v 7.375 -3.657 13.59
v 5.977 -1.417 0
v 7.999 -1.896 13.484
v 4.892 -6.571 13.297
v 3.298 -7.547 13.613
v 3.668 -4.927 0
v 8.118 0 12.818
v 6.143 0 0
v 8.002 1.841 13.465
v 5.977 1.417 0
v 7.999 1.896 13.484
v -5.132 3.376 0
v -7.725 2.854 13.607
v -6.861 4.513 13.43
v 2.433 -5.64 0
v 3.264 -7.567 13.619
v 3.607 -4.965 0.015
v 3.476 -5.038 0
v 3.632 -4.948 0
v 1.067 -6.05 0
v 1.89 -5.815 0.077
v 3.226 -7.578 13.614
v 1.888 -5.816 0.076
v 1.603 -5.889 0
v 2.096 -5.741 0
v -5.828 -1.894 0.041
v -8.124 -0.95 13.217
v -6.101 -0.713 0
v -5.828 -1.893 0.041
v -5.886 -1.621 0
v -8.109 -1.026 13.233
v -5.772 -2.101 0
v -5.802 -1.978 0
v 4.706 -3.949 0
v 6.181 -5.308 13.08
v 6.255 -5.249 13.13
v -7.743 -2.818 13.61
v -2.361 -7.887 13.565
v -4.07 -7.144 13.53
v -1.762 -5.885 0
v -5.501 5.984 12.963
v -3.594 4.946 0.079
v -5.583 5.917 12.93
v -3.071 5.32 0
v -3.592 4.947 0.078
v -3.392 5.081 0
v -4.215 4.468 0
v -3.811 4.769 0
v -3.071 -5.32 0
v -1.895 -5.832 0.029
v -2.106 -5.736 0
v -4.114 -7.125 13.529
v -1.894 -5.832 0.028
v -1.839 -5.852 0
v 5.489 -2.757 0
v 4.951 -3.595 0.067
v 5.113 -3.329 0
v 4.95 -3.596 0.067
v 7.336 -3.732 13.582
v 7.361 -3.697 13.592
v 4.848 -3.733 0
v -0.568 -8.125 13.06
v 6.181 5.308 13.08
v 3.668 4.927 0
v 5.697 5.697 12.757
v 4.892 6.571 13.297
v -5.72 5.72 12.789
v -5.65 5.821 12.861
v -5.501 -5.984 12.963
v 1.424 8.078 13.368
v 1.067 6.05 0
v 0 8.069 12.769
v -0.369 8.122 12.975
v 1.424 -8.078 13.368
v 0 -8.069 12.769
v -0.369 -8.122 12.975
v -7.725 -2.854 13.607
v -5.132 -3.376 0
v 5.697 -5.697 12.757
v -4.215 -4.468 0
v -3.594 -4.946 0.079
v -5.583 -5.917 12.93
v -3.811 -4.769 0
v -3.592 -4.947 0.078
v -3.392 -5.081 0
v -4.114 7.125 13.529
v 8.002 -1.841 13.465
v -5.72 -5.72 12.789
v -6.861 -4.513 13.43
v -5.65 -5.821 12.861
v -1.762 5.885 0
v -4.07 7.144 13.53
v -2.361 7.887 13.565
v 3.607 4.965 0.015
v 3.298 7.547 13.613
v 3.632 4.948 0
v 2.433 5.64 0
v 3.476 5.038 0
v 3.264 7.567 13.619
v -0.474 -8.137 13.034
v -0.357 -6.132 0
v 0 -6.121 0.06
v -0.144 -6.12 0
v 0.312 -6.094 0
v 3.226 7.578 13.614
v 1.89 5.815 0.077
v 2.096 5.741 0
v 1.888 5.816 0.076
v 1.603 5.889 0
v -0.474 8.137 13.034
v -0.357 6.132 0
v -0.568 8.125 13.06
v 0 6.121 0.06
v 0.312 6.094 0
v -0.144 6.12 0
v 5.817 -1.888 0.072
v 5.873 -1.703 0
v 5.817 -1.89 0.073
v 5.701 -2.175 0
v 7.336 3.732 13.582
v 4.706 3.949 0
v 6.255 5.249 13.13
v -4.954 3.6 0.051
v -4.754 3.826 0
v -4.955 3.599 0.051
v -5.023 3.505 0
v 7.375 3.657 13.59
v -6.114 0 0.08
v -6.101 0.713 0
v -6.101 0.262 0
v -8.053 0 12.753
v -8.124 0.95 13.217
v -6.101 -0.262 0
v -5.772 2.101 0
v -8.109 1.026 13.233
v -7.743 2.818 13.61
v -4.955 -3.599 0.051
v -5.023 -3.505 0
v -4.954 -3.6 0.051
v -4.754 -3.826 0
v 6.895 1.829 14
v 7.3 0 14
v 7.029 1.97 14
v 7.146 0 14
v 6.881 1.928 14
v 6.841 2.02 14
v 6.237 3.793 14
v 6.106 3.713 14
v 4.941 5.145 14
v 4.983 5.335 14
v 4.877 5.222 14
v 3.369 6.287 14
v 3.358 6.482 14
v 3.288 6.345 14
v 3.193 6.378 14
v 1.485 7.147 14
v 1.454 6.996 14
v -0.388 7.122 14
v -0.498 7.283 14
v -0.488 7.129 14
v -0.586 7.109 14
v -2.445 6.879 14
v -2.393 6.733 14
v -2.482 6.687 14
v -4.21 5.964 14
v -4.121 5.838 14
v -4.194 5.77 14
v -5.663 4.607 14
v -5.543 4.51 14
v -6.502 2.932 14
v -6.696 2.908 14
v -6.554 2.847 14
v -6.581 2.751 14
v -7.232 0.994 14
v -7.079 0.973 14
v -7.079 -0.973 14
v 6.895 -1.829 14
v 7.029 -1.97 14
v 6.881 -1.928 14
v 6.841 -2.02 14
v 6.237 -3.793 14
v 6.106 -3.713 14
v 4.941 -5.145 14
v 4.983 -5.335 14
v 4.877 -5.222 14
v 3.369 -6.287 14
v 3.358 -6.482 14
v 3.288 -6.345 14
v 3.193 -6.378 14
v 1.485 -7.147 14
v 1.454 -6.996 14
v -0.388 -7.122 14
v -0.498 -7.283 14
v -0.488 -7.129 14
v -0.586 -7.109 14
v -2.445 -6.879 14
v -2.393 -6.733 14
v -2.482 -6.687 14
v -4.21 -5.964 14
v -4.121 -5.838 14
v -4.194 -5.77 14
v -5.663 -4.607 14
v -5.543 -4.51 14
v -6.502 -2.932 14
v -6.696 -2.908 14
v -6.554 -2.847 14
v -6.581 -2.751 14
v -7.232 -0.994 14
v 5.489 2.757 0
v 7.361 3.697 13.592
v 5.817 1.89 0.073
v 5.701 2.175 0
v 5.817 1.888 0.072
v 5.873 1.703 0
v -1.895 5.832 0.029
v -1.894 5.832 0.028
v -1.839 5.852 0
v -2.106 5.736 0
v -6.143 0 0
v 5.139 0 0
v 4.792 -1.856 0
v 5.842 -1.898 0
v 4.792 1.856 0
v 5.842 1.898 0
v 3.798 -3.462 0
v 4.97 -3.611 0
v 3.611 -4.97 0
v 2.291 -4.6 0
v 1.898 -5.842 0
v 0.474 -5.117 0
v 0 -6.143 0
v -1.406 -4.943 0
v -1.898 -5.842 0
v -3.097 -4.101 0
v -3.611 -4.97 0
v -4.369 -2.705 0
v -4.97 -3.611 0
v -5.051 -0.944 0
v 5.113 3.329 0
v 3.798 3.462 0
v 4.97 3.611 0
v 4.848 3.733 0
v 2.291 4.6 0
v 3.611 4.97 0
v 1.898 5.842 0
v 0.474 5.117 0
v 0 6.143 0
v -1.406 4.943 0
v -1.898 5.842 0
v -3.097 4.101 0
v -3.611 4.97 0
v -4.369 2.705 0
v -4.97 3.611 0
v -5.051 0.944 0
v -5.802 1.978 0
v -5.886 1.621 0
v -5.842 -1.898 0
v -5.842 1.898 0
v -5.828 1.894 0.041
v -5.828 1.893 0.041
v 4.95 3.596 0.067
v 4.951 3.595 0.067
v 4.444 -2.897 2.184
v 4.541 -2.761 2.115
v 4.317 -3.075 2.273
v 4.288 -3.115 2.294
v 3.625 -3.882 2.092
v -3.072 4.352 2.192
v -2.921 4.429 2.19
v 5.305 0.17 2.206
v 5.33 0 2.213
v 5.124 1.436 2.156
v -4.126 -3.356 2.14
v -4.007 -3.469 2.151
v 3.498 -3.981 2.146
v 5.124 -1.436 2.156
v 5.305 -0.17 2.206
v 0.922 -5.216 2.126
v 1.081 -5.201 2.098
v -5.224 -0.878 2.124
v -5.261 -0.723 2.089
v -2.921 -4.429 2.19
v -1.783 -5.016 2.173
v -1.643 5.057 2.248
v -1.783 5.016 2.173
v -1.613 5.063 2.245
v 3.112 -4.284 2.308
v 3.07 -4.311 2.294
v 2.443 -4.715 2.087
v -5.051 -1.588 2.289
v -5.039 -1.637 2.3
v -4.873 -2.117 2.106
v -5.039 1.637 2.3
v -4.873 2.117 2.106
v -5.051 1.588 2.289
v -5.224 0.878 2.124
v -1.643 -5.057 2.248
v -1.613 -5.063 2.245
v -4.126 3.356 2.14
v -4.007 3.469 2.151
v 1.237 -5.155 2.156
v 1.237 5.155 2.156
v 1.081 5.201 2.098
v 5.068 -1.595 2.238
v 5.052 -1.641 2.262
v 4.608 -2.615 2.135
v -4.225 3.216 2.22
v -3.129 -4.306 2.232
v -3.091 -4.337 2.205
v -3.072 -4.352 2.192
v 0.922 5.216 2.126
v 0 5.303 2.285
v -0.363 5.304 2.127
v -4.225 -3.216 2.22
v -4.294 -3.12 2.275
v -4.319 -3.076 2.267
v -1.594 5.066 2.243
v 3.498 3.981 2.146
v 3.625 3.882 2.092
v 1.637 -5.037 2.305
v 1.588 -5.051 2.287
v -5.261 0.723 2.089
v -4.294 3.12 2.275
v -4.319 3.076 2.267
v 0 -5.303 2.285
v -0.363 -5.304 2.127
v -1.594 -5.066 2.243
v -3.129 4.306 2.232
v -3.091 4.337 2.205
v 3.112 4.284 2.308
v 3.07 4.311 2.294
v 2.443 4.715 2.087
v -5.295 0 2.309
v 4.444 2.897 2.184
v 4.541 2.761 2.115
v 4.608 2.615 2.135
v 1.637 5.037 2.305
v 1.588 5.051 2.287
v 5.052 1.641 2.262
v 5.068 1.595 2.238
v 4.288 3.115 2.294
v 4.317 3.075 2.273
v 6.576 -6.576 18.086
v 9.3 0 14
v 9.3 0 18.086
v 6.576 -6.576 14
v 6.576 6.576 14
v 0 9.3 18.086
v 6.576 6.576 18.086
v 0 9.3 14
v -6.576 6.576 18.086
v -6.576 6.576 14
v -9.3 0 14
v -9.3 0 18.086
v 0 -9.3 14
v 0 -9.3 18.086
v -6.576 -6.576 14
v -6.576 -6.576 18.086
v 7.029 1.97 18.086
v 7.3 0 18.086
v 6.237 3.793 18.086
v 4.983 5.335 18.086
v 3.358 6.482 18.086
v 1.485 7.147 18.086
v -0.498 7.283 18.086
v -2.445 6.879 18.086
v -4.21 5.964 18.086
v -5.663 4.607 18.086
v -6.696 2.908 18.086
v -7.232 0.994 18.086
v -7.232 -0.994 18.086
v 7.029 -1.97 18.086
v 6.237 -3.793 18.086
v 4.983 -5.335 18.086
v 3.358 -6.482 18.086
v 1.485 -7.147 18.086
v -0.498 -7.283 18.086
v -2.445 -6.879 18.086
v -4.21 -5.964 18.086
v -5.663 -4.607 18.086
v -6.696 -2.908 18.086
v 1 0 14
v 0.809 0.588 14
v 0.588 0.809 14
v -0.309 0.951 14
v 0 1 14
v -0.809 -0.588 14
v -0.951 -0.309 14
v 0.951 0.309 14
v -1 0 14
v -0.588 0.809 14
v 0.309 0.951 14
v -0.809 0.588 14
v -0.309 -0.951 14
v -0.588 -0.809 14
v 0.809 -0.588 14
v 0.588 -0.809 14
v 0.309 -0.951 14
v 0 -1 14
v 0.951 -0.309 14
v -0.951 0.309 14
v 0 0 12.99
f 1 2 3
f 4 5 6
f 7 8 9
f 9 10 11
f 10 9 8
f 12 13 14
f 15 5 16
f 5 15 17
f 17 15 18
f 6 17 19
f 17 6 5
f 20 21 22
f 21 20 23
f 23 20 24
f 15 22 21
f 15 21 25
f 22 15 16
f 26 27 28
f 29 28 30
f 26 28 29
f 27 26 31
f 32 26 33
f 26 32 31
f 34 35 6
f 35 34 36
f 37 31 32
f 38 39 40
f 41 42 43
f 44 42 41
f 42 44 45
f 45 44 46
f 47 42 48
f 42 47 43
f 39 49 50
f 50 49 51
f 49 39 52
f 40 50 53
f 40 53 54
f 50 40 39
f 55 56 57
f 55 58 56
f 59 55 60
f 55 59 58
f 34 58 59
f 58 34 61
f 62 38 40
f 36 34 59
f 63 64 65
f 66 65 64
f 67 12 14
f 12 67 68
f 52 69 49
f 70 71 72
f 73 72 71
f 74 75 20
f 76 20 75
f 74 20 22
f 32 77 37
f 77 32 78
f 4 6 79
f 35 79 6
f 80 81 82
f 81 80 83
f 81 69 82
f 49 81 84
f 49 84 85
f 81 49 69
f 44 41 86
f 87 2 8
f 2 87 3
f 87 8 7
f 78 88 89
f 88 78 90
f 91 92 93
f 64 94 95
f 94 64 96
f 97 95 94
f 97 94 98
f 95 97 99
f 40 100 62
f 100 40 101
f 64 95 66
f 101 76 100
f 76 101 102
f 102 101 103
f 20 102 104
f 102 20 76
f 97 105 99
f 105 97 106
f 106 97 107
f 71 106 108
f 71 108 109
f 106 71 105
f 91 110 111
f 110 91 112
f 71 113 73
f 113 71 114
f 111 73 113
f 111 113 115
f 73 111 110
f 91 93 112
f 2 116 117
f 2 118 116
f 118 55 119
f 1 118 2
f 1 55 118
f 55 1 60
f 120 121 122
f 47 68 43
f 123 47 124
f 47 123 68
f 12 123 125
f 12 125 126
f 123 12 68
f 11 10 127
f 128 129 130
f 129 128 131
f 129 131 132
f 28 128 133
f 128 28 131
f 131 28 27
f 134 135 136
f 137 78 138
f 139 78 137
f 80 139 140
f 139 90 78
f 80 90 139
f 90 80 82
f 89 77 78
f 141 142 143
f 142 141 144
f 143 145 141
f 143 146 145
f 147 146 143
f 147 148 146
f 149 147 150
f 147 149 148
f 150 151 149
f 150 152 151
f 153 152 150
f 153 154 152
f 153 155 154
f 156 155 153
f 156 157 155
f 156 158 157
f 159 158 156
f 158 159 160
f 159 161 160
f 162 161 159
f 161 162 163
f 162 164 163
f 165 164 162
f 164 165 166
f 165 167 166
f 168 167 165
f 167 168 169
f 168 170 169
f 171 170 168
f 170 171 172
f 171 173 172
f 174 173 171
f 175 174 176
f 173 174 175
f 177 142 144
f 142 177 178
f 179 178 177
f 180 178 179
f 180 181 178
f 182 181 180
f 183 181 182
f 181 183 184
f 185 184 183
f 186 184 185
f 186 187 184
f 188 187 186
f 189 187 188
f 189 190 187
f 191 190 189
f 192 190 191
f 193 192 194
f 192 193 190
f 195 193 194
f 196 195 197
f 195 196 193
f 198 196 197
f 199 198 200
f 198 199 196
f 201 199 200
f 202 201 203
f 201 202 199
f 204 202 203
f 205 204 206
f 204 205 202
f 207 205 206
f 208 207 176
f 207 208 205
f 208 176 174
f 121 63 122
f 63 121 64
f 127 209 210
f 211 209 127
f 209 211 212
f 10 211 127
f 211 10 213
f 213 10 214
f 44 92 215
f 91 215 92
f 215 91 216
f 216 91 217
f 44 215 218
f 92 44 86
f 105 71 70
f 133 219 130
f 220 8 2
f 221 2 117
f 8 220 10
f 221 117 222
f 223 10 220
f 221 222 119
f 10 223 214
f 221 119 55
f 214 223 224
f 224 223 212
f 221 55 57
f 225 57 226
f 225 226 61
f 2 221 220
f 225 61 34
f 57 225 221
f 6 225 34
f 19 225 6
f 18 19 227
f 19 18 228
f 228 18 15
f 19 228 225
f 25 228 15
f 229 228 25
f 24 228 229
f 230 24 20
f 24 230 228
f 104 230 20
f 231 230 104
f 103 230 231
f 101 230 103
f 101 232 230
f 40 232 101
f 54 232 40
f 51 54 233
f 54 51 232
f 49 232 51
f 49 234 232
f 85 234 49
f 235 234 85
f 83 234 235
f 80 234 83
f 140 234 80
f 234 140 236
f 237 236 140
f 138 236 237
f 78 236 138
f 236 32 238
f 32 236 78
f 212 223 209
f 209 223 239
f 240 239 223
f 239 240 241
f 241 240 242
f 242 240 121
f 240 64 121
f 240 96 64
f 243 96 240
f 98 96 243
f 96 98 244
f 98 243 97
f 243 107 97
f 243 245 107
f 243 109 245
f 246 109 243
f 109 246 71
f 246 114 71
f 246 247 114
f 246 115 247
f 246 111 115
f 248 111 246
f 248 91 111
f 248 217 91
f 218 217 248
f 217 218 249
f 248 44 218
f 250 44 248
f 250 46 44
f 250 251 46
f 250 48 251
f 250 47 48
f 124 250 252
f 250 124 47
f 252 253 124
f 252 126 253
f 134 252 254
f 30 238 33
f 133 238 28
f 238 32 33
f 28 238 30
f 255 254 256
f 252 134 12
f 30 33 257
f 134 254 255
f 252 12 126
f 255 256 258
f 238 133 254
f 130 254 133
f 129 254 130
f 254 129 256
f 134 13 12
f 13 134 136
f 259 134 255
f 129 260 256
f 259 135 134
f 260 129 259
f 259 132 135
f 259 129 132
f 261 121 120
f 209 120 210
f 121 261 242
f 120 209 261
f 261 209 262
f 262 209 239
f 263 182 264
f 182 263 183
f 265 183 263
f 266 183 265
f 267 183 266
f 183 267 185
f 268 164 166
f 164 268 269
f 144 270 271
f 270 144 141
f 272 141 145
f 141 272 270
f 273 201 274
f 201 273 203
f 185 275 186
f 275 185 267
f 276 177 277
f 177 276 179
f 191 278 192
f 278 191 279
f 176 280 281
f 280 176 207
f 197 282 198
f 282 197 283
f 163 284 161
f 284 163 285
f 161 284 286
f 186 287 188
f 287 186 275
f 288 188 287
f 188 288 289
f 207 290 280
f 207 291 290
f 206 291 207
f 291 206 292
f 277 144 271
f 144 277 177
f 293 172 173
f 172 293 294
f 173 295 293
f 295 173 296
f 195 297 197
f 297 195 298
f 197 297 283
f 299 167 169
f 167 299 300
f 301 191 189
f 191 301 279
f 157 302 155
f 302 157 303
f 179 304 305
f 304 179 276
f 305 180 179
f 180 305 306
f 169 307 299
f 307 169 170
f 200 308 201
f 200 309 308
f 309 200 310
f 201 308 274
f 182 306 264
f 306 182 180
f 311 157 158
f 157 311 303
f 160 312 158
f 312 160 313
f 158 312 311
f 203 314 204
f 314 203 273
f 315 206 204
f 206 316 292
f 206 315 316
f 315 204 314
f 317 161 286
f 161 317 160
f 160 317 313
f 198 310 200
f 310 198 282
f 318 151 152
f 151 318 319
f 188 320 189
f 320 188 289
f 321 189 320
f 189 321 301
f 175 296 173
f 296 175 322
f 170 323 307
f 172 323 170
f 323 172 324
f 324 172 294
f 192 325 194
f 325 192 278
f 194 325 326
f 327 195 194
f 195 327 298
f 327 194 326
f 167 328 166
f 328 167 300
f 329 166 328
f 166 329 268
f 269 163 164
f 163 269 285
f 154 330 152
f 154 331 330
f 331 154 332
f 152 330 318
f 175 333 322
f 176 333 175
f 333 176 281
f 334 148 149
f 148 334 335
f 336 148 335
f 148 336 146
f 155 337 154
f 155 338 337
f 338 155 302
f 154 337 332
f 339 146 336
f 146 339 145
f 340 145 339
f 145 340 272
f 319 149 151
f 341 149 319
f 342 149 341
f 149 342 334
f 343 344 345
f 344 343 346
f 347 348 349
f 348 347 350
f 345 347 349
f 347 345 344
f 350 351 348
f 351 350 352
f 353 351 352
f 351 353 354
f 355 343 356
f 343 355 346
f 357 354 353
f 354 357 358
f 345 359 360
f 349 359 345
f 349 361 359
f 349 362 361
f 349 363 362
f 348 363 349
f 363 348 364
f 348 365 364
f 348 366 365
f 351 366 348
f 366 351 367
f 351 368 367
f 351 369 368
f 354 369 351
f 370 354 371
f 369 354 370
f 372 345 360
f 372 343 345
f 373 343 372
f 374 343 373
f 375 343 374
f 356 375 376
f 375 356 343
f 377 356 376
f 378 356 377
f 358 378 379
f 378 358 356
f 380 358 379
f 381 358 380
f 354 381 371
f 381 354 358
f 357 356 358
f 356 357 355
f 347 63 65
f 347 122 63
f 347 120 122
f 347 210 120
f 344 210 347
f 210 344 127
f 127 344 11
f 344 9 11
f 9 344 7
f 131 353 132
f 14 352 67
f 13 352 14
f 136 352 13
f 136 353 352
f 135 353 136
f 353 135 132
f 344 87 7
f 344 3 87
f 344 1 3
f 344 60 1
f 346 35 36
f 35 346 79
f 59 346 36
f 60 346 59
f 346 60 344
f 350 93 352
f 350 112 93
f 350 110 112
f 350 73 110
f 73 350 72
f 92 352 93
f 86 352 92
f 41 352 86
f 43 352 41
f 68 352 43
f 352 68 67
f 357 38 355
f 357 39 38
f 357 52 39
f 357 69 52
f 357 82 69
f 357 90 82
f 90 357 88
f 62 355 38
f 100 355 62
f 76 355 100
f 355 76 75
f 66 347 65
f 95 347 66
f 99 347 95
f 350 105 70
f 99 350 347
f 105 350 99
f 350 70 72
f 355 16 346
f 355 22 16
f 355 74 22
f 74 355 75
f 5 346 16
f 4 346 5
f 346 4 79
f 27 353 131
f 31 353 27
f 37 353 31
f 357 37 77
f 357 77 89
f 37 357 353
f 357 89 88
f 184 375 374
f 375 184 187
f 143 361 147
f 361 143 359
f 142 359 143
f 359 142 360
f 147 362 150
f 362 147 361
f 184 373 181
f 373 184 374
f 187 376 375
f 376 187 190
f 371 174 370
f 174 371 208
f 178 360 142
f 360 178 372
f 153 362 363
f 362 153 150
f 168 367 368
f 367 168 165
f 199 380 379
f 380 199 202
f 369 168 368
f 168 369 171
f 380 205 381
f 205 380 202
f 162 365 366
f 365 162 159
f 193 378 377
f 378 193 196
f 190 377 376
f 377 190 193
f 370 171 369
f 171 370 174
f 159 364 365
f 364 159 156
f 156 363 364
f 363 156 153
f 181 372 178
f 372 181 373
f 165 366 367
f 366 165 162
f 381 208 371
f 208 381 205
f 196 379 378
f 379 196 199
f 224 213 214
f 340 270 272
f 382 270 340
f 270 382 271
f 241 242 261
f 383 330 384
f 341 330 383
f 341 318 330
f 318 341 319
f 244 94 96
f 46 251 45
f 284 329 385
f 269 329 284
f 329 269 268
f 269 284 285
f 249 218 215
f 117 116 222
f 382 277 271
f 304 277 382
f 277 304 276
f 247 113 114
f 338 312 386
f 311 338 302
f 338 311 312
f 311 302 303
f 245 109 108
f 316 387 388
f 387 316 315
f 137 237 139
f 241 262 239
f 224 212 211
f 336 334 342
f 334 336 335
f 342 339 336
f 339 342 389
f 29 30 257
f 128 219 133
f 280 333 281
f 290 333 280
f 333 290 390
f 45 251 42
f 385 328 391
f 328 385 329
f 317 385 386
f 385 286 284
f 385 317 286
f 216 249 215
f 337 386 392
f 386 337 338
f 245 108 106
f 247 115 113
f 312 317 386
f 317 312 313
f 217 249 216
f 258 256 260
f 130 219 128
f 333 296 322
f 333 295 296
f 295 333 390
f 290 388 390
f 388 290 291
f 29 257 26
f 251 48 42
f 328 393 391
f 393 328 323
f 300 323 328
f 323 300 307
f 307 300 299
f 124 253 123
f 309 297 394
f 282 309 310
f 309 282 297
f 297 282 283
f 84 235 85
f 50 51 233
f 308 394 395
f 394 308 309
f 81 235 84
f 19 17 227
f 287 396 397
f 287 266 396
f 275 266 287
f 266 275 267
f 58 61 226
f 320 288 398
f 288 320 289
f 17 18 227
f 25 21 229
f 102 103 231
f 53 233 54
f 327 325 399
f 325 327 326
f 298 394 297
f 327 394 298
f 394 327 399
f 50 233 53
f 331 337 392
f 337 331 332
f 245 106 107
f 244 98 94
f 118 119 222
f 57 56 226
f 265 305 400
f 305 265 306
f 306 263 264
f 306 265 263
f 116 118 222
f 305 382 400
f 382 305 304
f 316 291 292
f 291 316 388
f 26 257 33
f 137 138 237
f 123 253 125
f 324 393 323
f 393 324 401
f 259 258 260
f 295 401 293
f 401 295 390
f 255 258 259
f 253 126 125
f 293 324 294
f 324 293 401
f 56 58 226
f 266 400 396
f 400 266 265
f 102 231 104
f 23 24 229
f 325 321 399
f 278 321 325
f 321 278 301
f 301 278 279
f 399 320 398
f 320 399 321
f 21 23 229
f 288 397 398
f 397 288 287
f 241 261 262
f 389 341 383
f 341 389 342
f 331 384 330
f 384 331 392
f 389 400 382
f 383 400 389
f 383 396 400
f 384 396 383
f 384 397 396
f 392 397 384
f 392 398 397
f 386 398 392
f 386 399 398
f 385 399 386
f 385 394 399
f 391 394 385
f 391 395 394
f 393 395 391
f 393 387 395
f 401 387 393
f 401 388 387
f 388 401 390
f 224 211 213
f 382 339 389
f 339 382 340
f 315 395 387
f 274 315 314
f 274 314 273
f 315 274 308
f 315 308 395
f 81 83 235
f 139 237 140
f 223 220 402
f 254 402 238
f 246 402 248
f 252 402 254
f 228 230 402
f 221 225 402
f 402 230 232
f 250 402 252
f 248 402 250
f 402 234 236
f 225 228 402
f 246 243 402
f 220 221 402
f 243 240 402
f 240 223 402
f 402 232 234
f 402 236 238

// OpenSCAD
//Diameter of the flashlight barrel
BarrelDiameter=14.4; //mm
//Height of the diffuser portion, half barrel diameter makes a good diffuser, twice barrel diameter makes a signal wand...
CapHeight=14;
WallThickness=1; //mm
//Adjustment margin for your printer.
Margin=0.2; //mm
//Cut a cone out of the tip
DoCutout=1;//[0:No,1:Yes]
//Cut a notch out of the side-wall for a lanyard (attached to the flashlight)
NotchWidth=0;//[0:5]
//Cut out a hole to attach a lanyard to the tip itself
LanyardHole=0;//[0:5]
/* [Hidden] */
TipDiameter=BarrelDiameter*10/14; //mm
GripHeight=BarrelDiameter*3/14; //mm
NotchHeight=0.5;//[1:5]
// Facets in the anti-roll portion of the grip.
AntiRoll=8;

difference(){
 union(){
   //Cone Portion:
   difference(){
    cylinder(r1=TipDiameter/2+WallThickness, r2=(BarrelDiameter+Margin)/2+WallThickness,h=CapHeight);
    translate([0,0,WallThickness]) cylinder(r1=TipDiameter/2, r2=(BarrelDiameter+Margin)/2, h=CapHeight);
   }
   //Barrel Grip Portion:
   translate([0,0,CapHeight])
    difference(){
     union(){
      cylinder(r=(BarrelDiameter+Margin)/2+2*WallThickness, h=GripHeight+1, $fn=AntiRoll);
      translate([0,0,-1*((BarrelDiameter+Margin)/2+2*WallThickness)]) cylinder(r2=(BarrelDiameter+Margin)/2+2*WallThickness,r1=0,h=(BarrelDiameter+Margin)/2+2*WallThickness,$fn=AntiRoll);
     }
     translate([0,0,0]) cylinder(r=(BarrelDiameter+Margin)/2, h=GripHeight*10,center=true);
    }
  //Central, light-reflecting cone
  translate([0,0,0]) cylinder(r1=TipDiameter/2+WallThickness, r2=WallThickness, h=CapHeight);
 }
 if ( DoCutout ) translate([0,0,-0.01]) cylinder(r1=TipDiameter/2, r2=0, h=CapHeight-1);
 if ( NotchWidth ) {
  #translate([0,BarrelDiameter/2+WallThickness/2,CapHeight+GripHeight+NotchHeight])
   hull(){
    translate([0,0,NotchHeight]) rotate([90,0,0]) cylinder(r=NotchWidth/2,h=WallThickness*2,$fn=6, center=true);
    translate([0,0,-NotchHeight]) rotate([90,0,0]) cylinder(r=NotchWidth/2,h=WallThickness*2,$fn=6, center=true);
   }
 }
 if ( LanyardHole ){
  # translate([0,-BarrelDiameter/2+WallThickness/2,CapHeight+GripHeight-LanyardHole/2]) rotate([90,22.5,0]) cylinder(r=LanyardHole/2,h=WallThickness*2,$fn=8);
 }
 //translate([-50,-50,30]) cube([100,100,100]);
}
